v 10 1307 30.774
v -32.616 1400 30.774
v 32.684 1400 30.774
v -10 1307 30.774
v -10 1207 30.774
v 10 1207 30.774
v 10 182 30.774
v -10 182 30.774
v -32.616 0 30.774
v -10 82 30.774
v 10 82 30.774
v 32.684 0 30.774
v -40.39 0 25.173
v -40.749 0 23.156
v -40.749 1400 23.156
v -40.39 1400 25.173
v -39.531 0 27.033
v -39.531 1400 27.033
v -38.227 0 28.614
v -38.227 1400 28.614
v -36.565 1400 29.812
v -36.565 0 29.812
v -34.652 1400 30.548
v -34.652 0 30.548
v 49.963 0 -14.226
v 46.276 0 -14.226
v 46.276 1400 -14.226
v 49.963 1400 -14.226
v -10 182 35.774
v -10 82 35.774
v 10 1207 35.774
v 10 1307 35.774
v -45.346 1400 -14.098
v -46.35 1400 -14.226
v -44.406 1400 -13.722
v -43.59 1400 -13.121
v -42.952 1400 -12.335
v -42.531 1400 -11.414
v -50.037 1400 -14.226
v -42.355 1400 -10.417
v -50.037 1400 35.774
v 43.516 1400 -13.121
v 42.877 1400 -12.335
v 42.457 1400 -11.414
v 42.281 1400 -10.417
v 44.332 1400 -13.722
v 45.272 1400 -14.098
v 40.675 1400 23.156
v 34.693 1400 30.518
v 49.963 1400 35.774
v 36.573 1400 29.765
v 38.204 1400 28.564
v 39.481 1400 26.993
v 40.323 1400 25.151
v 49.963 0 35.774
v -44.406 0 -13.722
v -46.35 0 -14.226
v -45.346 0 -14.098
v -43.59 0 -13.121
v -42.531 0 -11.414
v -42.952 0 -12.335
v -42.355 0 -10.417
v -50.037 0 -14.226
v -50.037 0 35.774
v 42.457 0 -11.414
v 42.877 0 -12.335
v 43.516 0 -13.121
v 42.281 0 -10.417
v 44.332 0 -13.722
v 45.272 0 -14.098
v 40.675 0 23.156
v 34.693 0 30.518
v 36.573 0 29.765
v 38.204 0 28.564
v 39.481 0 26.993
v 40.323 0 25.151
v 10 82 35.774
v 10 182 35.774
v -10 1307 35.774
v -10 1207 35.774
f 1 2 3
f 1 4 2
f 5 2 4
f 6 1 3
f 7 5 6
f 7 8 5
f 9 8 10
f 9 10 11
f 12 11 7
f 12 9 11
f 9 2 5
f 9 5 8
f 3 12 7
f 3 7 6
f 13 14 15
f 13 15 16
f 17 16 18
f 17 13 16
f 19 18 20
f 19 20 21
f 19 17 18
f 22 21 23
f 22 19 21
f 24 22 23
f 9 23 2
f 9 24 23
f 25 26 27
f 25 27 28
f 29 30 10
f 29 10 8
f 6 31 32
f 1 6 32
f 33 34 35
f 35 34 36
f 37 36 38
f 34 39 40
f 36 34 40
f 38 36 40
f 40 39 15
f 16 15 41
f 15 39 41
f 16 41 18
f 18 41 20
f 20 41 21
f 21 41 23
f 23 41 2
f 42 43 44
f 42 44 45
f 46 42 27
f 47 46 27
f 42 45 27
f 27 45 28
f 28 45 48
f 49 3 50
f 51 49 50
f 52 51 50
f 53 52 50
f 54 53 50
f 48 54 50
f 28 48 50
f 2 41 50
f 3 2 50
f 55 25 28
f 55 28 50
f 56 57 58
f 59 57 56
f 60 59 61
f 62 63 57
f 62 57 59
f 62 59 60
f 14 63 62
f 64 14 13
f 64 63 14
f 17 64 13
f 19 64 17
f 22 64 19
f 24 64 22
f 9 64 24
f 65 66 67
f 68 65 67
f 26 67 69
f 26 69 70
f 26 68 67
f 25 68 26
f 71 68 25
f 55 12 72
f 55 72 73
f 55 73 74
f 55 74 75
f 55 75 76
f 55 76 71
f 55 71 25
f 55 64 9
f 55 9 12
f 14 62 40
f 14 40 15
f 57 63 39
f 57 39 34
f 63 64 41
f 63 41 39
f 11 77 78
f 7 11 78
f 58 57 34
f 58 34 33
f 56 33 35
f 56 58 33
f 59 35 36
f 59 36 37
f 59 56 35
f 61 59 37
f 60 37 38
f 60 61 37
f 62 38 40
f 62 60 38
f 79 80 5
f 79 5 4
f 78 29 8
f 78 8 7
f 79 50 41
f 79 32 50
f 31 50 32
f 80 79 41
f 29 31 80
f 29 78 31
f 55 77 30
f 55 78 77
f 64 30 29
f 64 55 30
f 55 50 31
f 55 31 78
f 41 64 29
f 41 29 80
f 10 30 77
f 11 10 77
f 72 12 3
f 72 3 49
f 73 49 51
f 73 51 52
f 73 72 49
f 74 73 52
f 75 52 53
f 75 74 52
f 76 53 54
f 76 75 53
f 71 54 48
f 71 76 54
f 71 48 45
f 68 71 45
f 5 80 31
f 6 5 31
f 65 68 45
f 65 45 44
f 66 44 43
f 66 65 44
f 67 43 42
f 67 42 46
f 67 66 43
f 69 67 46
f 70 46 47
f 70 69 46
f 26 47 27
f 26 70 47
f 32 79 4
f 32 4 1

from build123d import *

# Parameters (mm, degrees)
F1_DEPTH = 1400
F2_W     = 20
F2_H     = 100
F3_DEPTH = 5


with BuildPart() as f1:
    # F0 (on Front) → F1 (new body)
    with BuildSketch(Plane.XZ):
        with BuildLine():
            Line((49.962816, 35.773941), (-50.037184, 35.773941))
            Line((-50.037184, 35.773941), (-50.037184, -14.226059))
            Line((-50.037184, -14.226059), (-46.350433, -14.226059))
            ThreePointArc((-46.350433, -14.226059), (-43.590398, -13.121264), (-42.355, -10.417164))
            Line((-42.355, -10.417164), (-40.749153, 23.156153))
            ThreePointArc((-40.749153, 23.156153), (-38.227094, 28.613997), (-32.616079, 30.773941))
            Line((-32.616079, 30.773941), (32.683921, 30.773941))
            ThreePointArc((32.683921, 30.773941), (38.203989, 28.564351), (40.674785, 23.156153))
            Line((40.674785, 23.156153), (42.280633, -10.417164))
            ThreePointArc((42.280633, -10.417164), (43.516031, -13.121264), (46.276065, -14.226059))
            Line((46.276065, -14.226059), (49.962816, -14.226059))
            Line((49.962816, -14.226059), (49.962816, 35.773941))
        make_face()
    extrude(amount=-F1_DEPTH)

    # F2 (on face) → F3 (cut, through all)
    with BuildSketch(Plane.XY.offset(35.773941)):
        with Locations((0, 132)):
            Rectangle(F2_W, F2_H)
        with Locations((0, 1257)):
            Rectangle(F2_W, F2_H)
    extrude(amount=-F3_DEPTH, mode=Mode.SUBTRACT)


solid = f1.part
